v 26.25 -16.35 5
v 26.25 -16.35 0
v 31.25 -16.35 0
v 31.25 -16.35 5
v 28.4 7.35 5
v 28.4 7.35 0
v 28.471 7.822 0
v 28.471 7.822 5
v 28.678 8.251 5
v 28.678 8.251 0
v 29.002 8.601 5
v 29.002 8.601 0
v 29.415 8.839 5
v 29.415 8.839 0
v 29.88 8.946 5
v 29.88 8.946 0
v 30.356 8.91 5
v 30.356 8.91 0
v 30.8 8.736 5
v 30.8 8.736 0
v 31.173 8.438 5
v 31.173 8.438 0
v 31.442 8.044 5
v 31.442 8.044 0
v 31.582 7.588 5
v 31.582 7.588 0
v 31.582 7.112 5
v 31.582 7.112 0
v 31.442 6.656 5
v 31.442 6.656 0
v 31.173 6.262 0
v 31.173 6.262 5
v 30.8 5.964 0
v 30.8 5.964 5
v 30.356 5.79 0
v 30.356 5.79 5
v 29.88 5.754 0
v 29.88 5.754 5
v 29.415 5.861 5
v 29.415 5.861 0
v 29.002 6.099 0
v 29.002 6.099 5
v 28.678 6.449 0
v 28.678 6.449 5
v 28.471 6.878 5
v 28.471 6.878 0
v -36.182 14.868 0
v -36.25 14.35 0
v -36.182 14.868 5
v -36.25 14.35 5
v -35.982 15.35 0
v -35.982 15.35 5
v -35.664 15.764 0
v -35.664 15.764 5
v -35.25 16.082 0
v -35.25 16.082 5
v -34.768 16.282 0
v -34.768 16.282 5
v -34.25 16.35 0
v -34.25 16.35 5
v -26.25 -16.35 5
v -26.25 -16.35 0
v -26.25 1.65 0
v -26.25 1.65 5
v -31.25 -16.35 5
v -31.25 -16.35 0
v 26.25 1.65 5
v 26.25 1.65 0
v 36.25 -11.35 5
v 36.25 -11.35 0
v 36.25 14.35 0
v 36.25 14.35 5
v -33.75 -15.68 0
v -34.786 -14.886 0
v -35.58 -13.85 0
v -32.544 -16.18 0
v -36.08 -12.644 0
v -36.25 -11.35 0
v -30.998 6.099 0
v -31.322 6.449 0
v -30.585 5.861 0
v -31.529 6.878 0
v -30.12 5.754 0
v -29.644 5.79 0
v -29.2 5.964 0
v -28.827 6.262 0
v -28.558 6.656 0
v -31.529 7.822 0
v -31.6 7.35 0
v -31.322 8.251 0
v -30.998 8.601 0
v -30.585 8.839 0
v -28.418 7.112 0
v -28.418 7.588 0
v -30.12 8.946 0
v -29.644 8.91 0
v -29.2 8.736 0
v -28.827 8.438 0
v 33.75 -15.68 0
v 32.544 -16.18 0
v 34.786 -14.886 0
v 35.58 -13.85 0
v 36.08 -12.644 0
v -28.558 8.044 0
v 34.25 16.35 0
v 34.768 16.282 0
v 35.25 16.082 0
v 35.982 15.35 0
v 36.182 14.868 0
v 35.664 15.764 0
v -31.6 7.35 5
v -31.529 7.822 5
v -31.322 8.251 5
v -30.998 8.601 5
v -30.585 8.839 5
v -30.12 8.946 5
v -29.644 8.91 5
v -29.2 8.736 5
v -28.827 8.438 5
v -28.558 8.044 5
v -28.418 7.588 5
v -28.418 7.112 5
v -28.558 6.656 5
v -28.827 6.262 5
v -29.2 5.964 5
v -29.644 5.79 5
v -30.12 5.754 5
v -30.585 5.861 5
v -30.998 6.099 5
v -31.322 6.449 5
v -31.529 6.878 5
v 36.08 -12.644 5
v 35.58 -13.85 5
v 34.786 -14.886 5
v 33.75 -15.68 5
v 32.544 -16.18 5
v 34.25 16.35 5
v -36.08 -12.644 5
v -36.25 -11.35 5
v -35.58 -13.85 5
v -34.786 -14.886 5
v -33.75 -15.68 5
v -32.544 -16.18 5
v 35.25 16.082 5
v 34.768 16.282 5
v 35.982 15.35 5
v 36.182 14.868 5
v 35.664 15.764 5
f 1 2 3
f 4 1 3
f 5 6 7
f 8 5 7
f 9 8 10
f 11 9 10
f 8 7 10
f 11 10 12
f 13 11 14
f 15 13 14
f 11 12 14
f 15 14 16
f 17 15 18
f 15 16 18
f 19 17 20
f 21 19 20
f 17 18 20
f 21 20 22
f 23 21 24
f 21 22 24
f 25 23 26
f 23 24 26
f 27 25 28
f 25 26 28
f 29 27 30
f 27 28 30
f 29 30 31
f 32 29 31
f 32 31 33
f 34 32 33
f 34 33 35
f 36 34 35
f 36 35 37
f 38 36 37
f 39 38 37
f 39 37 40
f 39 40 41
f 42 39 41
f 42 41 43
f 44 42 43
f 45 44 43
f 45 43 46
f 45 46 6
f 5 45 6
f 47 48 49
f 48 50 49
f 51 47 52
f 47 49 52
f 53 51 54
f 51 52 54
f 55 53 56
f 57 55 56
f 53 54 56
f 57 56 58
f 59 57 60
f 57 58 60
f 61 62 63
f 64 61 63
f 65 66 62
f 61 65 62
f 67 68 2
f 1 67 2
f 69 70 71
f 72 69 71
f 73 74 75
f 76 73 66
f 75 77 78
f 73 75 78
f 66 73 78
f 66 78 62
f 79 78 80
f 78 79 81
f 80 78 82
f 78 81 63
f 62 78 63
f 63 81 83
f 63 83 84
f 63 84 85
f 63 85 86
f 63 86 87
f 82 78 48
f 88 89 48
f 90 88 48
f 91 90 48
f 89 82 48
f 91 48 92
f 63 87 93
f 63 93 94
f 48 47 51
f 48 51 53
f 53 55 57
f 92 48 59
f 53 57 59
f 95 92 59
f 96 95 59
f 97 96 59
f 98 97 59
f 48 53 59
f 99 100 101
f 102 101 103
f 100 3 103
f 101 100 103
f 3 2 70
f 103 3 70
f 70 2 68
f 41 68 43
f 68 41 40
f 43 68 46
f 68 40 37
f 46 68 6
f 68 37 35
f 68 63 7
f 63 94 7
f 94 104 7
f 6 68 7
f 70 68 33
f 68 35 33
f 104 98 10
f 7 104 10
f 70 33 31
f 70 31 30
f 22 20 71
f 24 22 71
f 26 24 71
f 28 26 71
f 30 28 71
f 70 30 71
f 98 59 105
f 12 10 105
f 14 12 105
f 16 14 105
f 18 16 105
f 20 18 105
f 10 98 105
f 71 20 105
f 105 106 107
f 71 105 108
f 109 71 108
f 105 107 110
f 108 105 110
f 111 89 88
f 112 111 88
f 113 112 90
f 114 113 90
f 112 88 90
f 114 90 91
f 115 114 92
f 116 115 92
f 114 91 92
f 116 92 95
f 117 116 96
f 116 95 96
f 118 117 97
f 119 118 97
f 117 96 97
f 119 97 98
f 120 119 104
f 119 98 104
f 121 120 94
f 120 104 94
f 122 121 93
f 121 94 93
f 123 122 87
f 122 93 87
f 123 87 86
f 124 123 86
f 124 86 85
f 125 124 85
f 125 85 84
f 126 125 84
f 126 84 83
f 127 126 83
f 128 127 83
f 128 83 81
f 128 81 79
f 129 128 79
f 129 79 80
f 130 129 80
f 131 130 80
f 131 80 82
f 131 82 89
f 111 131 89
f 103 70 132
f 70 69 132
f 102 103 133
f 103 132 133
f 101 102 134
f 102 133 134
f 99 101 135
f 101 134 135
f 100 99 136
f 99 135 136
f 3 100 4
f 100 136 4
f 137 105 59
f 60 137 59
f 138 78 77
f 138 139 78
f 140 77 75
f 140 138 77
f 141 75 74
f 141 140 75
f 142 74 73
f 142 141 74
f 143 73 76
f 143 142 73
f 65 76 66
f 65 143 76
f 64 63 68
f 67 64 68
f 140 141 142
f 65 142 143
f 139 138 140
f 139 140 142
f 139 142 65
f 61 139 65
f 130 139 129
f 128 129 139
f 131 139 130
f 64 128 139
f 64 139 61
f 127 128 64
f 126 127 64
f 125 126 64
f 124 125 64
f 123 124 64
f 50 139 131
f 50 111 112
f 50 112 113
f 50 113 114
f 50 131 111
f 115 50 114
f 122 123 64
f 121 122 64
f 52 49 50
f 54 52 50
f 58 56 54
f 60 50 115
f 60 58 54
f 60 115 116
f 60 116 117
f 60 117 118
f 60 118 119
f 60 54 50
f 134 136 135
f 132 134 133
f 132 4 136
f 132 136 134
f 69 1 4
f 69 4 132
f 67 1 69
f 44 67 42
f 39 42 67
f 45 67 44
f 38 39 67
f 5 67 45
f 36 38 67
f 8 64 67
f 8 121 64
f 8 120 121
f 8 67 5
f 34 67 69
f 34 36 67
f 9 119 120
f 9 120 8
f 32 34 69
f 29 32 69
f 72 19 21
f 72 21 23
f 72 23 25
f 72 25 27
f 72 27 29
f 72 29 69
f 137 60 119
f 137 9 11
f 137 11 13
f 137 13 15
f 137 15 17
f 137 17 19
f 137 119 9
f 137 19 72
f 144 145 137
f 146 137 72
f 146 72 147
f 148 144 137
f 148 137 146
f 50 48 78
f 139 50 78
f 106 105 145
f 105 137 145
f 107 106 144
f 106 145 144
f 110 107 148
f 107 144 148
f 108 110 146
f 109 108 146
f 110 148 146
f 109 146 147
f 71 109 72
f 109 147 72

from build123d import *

# Parameters (mm, degrees)
F1_DEPTH = 5
F3_D     = 3.2
F3_DEPTH = 14.25
F3_TIP   = 0.9613769904
F4_R     = 5
F5_R     = 2


with BuildPart() as f1:
    # F0 (on Top) → F1 (new body)
    with BuildSketch(Plane.XY):
        Polygon((-36.25, 16.35), (-36.25, -16.35), (-26.25, -16.35), (-26.25, 1.65), (26.25, 1.65), (26.25, -16.35), (36.25, -16.35), (36.25, 16.35), align=None)
    extrude(amount=F1_DEPTH)

    # F3
    with Locations(Plane.XY.offset(5)):
        with Locations((-30, 7.35), (30, 7.35)):
            Hole(F3_D / 2, depth=F3_DEPTH)
            with Locations((0, 0, -(F3_DEPTH + F3_TIP / 2))):  # 118° drill point
                Cone(0, F3_D / 2, F3_TIP, mode=Mode.SUBTRACT)

    # F4
    f4_edges = [f1.edges().sort_by_distance(p)[0] for p in [
        (-36.25, -16.35, 2.5),
        (36.25, -16.35, 2.5),
    ]]
    fillet(f4_edges, radius=F4_R)

    # F5
    f5_edges = [f1.edges().sort_by_distance(p)[0] for p in [
        (36.25, 16.35, 2.5),
        (-36.25, 16.35, 2.5),
    ]]
    fillet(f5_edges, radius=F5_R)


solid = f1.part
